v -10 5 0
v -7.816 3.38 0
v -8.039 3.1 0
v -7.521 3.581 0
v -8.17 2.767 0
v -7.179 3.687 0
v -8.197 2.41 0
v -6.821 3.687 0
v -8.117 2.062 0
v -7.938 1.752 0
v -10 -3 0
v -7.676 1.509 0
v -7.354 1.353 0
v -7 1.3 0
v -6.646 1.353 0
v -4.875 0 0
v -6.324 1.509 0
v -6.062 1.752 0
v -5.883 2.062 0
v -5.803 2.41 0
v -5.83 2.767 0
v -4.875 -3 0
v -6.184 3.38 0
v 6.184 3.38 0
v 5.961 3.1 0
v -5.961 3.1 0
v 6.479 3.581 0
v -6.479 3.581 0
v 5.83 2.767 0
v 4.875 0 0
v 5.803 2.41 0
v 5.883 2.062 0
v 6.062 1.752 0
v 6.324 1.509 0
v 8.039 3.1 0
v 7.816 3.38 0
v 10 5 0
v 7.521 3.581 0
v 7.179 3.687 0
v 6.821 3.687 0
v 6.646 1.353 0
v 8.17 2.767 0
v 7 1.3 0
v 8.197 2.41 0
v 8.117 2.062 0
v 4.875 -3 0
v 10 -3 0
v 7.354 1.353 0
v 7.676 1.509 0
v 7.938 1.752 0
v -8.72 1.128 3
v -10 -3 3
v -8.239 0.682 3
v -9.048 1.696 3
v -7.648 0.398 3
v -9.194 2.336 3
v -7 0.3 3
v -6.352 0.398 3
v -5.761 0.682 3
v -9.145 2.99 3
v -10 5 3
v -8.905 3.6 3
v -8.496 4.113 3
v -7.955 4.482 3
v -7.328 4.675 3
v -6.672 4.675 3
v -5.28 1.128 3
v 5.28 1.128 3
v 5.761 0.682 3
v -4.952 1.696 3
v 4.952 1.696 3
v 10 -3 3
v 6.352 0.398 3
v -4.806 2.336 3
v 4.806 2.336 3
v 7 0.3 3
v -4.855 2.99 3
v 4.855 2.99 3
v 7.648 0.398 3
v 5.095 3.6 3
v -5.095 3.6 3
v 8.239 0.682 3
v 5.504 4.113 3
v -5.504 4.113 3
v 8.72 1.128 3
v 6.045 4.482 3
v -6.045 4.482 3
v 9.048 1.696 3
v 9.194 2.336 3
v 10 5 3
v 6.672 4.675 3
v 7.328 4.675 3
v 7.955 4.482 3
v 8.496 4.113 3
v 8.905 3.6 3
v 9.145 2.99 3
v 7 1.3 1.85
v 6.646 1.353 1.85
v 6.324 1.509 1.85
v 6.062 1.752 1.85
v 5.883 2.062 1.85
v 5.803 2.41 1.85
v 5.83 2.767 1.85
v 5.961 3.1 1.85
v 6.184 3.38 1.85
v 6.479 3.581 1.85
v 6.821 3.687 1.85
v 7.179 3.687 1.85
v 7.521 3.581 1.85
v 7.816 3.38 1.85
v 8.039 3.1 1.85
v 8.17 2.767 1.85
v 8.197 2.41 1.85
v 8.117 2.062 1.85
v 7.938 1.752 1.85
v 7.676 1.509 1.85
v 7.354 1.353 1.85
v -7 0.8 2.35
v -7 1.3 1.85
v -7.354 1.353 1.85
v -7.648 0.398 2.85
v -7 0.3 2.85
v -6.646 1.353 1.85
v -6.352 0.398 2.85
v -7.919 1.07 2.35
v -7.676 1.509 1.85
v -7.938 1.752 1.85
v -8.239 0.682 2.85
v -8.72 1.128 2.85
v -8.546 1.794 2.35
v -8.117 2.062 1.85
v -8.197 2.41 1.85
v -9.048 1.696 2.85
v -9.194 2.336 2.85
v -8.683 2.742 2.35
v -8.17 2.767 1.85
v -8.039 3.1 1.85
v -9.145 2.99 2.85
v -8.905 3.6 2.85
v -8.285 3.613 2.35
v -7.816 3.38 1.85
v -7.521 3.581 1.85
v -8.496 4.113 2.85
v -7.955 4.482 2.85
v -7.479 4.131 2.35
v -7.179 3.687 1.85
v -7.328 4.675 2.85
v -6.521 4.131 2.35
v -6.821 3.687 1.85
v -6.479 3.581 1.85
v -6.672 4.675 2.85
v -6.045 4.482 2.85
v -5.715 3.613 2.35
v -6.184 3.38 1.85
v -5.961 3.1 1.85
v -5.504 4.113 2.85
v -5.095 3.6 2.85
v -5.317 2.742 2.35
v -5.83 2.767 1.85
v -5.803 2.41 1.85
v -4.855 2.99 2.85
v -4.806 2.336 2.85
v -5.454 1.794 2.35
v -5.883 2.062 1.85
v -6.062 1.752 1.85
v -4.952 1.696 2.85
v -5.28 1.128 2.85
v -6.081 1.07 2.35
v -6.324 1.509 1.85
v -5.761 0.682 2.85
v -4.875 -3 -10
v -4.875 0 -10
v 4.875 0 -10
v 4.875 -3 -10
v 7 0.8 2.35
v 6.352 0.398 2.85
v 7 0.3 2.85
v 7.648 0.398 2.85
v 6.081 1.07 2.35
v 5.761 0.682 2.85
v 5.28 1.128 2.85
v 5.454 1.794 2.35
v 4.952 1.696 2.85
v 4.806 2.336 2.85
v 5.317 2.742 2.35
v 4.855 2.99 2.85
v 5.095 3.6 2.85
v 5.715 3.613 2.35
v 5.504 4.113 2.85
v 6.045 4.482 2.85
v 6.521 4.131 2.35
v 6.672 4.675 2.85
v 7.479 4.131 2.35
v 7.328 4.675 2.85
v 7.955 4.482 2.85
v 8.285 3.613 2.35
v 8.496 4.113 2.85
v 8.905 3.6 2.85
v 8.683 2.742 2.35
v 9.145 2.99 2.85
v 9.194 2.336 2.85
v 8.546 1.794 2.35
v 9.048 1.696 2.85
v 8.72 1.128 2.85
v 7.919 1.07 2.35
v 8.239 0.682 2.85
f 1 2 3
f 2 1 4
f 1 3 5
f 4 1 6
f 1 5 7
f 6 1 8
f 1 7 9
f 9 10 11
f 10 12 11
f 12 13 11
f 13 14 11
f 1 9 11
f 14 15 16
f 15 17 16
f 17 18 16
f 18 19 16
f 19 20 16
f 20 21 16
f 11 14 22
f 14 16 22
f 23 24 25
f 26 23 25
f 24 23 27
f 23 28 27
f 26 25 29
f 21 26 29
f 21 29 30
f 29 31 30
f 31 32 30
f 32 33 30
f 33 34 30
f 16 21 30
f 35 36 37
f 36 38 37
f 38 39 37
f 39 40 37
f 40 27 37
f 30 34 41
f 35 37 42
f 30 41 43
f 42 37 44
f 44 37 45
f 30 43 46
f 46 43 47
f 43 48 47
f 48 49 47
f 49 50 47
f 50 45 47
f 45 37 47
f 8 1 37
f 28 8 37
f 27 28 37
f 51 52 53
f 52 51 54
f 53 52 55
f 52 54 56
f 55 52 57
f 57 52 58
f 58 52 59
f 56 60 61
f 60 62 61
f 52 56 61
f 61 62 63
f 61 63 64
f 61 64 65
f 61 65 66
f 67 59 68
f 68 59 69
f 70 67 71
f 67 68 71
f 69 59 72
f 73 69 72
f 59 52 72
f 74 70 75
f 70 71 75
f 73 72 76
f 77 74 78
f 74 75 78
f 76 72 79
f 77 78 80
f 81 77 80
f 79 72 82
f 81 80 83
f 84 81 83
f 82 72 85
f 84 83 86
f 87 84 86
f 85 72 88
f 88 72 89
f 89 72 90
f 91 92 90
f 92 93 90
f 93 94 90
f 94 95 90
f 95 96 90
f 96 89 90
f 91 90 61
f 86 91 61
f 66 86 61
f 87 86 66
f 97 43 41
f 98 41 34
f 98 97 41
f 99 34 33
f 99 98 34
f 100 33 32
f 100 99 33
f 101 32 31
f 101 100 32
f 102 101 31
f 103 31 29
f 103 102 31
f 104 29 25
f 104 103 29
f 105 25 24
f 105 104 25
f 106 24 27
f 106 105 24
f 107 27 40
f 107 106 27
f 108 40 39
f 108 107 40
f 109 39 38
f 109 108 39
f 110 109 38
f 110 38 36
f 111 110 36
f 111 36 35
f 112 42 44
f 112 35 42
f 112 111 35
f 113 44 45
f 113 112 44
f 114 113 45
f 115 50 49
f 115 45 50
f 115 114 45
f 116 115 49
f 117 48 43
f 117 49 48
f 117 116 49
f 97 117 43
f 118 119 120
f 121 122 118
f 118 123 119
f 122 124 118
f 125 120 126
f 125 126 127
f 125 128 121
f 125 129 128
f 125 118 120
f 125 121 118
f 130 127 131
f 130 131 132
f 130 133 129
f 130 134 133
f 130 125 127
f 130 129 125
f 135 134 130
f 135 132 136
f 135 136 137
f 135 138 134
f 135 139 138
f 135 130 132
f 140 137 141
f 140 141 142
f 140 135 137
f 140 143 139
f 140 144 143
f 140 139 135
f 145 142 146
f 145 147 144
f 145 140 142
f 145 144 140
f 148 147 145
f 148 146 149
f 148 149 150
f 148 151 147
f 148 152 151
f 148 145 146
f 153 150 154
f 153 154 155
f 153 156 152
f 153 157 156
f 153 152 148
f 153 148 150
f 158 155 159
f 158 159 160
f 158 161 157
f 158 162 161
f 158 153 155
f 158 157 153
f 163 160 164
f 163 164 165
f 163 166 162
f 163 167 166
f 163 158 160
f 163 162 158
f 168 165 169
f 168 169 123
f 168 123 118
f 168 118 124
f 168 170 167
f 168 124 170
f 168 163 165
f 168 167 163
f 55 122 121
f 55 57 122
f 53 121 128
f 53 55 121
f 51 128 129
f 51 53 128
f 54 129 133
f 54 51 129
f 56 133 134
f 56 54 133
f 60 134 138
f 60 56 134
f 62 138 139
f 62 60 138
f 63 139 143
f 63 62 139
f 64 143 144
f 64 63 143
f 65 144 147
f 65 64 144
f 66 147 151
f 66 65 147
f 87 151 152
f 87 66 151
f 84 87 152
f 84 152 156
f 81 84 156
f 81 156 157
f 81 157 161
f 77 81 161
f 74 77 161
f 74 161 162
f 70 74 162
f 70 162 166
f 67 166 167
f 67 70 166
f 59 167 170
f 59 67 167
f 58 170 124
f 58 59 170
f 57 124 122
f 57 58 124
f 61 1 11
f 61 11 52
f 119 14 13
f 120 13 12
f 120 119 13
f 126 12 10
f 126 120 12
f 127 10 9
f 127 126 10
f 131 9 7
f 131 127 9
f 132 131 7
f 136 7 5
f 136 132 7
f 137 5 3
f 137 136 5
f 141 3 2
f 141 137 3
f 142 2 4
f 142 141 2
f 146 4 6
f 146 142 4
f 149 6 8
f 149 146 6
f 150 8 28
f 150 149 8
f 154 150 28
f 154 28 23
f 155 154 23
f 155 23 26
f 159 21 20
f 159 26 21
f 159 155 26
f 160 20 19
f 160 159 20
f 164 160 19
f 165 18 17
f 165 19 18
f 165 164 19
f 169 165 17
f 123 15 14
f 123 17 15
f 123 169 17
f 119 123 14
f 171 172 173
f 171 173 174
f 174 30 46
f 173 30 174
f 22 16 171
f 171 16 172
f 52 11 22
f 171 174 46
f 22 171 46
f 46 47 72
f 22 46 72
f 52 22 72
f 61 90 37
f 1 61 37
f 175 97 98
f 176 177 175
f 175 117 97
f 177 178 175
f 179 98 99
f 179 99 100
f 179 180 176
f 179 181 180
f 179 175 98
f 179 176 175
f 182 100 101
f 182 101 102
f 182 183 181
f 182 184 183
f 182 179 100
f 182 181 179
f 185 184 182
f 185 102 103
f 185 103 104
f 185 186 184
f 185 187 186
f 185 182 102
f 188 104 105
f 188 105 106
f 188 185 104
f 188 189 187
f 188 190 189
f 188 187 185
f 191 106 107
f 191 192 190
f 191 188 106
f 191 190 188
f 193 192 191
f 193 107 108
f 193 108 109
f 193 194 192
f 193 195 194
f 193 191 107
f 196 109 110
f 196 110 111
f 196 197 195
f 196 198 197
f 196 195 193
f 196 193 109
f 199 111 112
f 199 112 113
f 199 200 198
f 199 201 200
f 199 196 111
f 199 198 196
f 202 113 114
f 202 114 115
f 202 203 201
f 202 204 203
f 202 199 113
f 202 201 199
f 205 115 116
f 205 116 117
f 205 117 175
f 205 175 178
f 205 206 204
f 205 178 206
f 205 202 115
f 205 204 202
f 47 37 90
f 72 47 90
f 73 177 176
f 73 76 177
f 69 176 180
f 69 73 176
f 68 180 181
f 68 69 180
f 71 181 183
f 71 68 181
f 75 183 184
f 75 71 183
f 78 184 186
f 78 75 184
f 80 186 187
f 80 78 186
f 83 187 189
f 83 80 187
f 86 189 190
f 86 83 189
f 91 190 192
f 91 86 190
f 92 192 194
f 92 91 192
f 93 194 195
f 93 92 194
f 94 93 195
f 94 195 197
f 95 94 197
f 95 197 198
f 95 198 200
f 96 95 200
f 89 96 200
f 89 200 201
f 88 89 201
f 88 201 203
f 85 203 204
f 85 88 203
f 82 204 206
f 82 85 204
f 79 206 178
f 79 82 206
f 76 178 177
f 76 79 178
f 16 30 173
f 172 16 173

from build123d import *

# Parameters (mm, degrees)
BOSS_EXTRUDE1_DEPTH                            = 10
SKETCH2_W                                      = 5.125
SKETCH2_H                                      = 10
CUT_EXTRUDE1_DEPTH                             = 4
CSK_FOR_M2_FLAT_HEAD_MACHINE_SCREW1_AT_2_COUNT = 2
CSK_FOR_M2_FLAT_HEAD_MACHINE_SCREW1_AT_2_PITCH = 14


with BuildPart() as part:
    # Sketch1 → Boss-Extrude1 (new body, symmetric)
    with BuildSketch(Plane(origin=(0, 0, 0), x_dir=(0, 0, -1), z_dir=(1, 0, 0))):
        Polygon((0, 0), (10, 0), (10, -3), (-3, -3), (-3, 5), (0, 5), align=None)
    extrude(amount=BOSS_EXTRUDE1_DEPTH, both=True)

    # Sketch2 → Cut-Extrude1 (cut, through all)
    with BuildSketch(Plane(origin=(0, 0, 0), x_dir=(1, 0, 0), z_dir=(0, 1, 0))):
        with Locations((-7.4375, 5)):
            Rectangle(SKETCH2_W, SKETCH2_H)
        with Locations((7.4375, 5)):
            Rectangle(SKETCH2_W, SKETCH2_H)
    extrude(amount=-CUT_EXTRUDE1_DEPTH, mode=Mode.SUBTRACT)

    # Sketch4 → CSK for M2 Flat Head Machine Screw1 (revolve, cut)
    with BuildSketch(Plane(origin=(7, 2.5, 3), x_dir=(0, -1, 0), z_dir=(1, 0, 0))):
        Polygon((0, 0), (0, 20.721032743), (1.2, 20), (1.2, 1.15), (2.2, 0.15), (2.2, 0), align=None)
    csk_for_m2_flat_head_machine_screw1 = revolve(axis=Axis((7, 2.5, 9.35), (0, 0, -1)), mode=Mode.SUBTRACT)

    # CSK for M2 Flat Head Machine Screw1 at 2: CSK for M2 Flat Head Machine Screw1 ×2
    with Locations(*[(-i * CSK_FOR_M2_FLAT_HEAD_MACHINE_SCREW1_AT_2_PITCH, 0, 0) for i in range(1, CSK_FOR_M2_FLAT_HEAD_MACHINE_SCREW1_AT_2_COUNT)]):
        add(csk_for_m2_flat_head_machine_screw1, mode=Mode.SUBTRACT)


solid = part.part
